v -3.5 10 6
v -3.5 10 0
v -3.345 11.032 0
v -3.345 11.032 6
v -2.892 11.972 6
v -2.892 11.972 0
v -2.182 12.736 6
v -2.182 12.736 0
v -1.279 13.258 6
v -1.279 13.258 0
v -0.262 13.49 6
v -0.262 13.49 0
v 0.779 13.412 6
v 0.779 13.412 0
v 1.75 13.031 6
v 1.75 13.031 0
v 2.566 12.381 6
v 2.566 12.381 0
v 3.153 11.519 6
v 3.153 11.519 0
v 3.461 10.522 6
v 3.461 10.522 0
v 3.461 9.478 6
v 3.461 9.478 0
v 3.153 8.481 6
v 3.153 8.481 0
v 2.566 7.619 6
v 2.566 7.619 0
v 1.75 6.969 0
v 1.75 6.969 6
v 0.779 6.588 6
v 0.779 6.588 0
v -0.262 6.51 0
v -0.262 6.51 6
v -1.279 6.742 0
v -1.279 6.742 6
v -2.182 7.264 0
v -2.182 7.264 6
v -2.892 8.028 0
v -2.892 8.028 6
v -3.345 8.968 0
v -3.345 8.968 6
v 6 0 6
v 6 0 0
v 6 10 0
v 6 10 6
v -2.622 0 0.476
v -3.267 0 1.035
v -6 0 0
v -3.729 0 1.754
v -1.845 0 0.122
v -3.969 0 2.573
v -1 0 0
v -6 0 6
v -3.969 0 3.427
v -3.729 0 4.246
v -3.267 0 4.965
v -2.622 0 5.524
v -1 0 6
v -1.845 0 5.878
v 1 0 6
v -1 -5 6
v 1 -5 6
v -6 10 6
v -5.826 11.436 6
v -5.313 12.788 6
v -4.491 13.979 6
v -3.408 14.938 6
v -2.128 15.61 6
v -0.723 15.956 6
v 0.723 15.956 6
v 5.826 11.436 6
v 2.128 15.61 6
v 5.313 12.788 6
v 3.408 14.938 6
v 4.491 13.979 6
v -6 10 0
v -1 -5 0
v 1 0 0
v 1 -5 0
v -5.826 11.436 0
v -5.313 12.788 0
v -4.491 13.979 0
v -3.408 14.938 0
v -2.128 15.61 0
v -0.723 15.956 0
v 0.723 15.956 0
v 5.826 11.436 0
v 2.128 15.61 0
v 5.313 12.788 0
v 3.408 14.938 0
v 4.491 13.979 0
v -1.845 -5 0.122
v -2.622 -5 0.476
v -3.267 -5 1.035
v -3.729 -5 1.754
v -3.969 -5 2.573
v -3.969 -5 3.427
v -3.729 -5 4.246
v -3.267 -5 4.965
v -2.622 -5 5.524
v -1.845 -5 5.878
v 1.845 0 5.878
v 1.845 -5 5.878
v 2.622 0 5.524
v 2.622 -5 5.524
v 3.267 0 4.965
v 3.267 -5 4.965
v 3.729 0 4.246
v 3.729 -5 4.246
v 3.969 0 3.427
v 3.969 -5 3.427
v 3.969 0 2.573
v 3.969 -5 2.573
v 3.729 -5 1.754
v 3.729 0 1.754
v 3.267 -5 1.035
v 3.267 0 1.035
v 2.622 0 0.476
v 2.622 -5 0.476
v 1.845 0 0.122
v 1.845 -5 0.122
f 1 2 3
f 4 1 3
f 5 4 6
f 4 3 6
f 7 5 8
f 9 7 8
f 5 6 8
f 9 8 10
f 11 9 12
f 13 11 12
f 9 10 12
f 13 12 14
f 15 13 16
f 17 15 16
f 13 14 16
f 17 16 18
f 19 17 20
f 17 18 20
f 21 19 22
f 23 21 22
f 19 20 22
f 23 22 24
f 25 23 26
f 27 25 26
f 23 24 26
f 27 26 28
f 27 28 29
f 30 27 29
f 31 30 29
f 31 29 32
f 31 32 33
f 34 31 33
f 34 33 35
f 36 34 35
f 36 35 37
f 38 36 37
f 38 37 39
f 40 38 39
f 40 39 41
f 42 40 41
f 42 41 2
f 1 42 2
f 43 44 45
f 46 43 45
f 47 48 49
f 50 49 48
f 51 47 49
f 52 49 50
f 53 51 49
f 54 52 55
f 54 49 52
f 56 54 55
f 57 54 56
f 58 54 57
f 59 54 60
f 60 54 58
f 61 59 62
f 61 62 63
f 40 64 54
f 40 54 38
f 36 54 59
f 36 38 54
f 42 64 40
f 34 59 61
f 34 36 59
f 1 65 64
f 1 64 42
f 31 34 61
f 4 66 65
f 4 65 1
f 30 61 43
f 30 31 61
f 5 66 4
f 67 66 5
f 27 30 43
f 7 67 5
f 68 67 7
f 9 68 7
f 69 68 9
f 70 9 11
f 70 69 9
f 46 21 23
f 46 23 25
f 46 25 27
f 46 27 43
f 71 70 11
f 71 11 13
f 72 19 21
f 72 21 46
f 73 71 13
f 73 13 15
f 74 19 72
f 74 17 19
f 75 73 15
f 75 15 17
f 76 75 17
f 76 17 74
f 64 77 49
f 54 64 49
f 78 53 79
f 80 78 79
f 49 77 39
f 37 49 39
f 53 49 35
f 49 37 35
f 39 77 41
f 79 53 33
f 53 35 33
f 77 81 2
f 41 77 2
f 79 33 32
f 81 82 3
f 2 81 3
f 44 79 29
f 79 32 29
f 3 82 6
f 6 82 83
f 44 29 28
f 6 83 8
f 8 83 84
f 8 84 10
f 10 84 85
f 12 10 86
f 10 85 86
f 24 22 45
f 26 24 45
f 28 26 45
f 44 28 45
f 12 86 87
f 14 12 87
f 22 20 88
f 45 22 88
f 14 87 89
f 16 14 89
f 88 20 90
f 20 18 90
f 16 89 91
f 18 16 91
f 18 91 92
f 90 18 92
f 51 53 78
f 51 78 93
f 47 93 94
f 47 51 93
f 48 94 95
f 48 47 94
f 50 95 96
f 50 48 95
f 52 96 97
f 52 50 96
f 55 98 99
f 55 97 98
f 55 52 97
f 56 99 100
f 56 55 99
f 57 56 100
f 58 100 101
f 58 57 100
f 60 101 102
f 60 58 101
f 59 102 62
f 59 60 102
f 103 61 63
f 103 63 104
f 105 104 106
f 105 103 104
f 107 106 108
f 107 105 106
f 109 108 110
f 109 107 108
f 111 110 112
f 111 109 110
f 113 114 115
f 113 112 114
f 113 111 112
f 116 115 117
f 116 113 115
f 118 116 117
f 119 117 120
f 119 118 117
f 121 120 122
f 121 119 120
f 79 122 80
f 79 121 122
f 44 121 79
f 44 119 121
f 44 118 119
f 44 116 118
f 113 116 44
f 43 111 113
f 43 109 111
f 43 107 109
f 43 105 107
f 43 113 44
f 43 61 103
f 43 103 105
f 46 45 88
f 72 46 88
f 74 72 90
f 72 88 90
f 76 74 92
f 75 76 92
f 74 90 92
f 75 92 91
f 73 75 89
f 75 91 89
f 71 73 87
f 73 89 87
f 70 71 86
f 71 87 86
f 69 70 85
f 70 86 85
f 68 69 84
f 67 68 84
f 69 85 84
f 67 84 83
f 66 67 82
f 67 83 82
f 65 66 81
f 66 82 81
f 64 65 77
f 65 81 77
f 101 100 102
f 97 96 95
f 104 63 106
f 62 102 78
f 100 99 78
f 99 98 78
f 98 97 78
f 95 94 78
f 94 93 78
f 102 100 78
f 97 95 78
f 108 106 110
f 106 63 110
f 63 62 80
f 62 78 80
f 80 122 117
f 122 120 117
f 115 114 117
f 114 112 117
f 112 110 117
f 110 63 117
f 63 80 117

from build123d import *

# Parameters (mm, degrees)
BOSS_EXTRUDE1_DEPTH       = 6
M8X1_0_TAPPED_HOLE1_D     = 7
M8X1_0_TAPPED_HOLE1_DEPTH = 19
M8X1_0_TAPPED_HOLE1_TIP   = 2.103012167
CUT_EXTRUDE1_DEPTH        = 23.649503306
CUT_EXTRUDE1_DEPTH_BACK   = 5
SKETCH4_W                 = 9.430442817
SKETCH4_H                 = 6.865018404


with BuildPart() as part:
    # Sketch1 → Boss-Extrude1 (new body)
    with BuildSketch(Plane.XY):
        with BuildLine():
            Line((-4, -5), (4, -5))
            Line((4, -5), (4, 0))
            Line((4, 0), (6, 0))
            Line((6, 0), (6, 10))
            ThreePointArc((6, 10), (0, 16), (-6, 10))
            Line((-6, 10), (-6, 0))
            Line((-6, 0), (-4, 0))
            Line((-4, 0), (-4, -5))
        make_face()
    extrude(amount=BOSS_EXTRUDE1_DEPTH)

    # M8x1.0 Tapped Hole1
    with Locations(Plane.XY.offset(6)):
        with Locations((0, 10)):
            Hole(M8X1_0_TAPPED_HOLE1_D / 2, depth=M8X1_0_TAPPED_HOLE1_DEPTH)
            with Locations((0, 0, -(M8X1_0_TAPPED_HOLE1_DEPTH + M8X1_0_TAPPED_HOLE1_TIP / 2))):  # 118° drill point
                Cone(0, M8X1_0_TAPPED_HOLE1_D / 2, M8X1_0_TAPPED_HOLE1_TIP, mode=Mode.SUBTRACT)

    # Sketch4 → Cut-Extrude1 (cut, two sides: drawn at the far end of the back side and taken through both)
    with BuildSketch(Plane.XZ.offset(5).offset(-CUT_EXTRUDE1_DEPTH_BACK)):
        with Locations((0.112084889, 2.942713281)):
            Rectangle(SKETCH4_W, SKETCH4_H)
        with BuildLine():
            Line((-1, 6), (1, 6))
            ThreePointArc((1, 6), (4, 3), (1, 0))
            Line((1, 0), (-1, 0))
            ThreePointArc((-1, 0), (-4, 3), (-1, 6))
        make_face(mode=Mode.SUBTRACT)
    extrude(amount=CUT_EXTRUDE1_DEPTH + CUT_EXTRUDE1_DEPTH_BACK, mode=Mode.SUBTRACT)


solid = part.part
